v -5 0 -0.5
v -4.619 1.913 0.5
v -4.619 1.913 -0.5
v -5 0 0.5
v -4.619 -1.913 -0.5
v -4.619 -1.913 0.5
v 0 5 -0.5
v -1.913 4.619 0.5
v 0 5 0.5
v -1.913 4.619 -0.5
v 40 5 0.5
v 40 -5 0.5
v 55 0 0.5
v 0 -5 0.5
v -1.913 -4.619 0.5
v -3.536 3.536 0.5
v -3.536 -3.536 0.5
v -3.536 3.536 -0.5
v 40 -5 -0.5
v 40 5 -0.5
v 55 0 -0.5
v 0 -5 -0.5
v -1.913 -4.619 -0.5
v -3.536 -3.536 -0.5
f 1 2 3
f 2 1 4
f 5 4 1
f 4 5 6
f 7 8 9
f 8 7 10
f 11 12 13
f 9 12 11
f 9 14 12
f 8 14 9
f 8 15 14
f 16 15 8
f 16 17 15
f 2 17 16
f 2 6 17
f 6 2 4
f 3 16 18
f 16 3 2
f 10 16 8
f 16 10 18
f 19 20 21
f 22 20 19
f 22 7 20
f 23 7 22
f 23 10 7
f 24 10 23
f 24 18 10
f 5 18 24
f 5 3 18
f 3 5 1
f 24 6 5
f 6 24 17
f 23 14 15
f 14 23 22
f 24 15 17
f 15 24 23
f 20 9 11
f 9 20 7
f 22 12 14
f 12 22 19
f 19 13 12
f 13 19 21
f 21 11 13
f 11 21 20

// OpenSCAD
// Super simple collar stay, a userful but super simple print.
// Remember to print two :)

// all measurements in mm

// thickness of collar stay, typically 1mm or a little more
thickness=1; 
// total length of collar stay. Try 60mm if unsure
total_length=60;
// length of the triangular tip. Try 15mm if unsure.
tip=15;
// width of collar stay. 10mm is typical, but I've seen 8mm - 12mm
width=10;

// Customizable variables end here


module collar_stay(_thickness, _total_length, _tip, _width) {
  end_radius=_width/2;
  cube_l=_total_length - end_radius - _tip;
  cylinder(r=end_radius, h=_thickness, center=true);
  translate([cube_l/2,0,0])
    cube([cube_l, _width, _thickness], center=true);
  translate([cube_l, 0, 0])
    linear_extrude(height=_thickness, center=true) polygon(points=[[0, -_width/2], [0, _width/2], [_tip, 0]]);
}

collar_stay(thickness, total_length, tip, width);
